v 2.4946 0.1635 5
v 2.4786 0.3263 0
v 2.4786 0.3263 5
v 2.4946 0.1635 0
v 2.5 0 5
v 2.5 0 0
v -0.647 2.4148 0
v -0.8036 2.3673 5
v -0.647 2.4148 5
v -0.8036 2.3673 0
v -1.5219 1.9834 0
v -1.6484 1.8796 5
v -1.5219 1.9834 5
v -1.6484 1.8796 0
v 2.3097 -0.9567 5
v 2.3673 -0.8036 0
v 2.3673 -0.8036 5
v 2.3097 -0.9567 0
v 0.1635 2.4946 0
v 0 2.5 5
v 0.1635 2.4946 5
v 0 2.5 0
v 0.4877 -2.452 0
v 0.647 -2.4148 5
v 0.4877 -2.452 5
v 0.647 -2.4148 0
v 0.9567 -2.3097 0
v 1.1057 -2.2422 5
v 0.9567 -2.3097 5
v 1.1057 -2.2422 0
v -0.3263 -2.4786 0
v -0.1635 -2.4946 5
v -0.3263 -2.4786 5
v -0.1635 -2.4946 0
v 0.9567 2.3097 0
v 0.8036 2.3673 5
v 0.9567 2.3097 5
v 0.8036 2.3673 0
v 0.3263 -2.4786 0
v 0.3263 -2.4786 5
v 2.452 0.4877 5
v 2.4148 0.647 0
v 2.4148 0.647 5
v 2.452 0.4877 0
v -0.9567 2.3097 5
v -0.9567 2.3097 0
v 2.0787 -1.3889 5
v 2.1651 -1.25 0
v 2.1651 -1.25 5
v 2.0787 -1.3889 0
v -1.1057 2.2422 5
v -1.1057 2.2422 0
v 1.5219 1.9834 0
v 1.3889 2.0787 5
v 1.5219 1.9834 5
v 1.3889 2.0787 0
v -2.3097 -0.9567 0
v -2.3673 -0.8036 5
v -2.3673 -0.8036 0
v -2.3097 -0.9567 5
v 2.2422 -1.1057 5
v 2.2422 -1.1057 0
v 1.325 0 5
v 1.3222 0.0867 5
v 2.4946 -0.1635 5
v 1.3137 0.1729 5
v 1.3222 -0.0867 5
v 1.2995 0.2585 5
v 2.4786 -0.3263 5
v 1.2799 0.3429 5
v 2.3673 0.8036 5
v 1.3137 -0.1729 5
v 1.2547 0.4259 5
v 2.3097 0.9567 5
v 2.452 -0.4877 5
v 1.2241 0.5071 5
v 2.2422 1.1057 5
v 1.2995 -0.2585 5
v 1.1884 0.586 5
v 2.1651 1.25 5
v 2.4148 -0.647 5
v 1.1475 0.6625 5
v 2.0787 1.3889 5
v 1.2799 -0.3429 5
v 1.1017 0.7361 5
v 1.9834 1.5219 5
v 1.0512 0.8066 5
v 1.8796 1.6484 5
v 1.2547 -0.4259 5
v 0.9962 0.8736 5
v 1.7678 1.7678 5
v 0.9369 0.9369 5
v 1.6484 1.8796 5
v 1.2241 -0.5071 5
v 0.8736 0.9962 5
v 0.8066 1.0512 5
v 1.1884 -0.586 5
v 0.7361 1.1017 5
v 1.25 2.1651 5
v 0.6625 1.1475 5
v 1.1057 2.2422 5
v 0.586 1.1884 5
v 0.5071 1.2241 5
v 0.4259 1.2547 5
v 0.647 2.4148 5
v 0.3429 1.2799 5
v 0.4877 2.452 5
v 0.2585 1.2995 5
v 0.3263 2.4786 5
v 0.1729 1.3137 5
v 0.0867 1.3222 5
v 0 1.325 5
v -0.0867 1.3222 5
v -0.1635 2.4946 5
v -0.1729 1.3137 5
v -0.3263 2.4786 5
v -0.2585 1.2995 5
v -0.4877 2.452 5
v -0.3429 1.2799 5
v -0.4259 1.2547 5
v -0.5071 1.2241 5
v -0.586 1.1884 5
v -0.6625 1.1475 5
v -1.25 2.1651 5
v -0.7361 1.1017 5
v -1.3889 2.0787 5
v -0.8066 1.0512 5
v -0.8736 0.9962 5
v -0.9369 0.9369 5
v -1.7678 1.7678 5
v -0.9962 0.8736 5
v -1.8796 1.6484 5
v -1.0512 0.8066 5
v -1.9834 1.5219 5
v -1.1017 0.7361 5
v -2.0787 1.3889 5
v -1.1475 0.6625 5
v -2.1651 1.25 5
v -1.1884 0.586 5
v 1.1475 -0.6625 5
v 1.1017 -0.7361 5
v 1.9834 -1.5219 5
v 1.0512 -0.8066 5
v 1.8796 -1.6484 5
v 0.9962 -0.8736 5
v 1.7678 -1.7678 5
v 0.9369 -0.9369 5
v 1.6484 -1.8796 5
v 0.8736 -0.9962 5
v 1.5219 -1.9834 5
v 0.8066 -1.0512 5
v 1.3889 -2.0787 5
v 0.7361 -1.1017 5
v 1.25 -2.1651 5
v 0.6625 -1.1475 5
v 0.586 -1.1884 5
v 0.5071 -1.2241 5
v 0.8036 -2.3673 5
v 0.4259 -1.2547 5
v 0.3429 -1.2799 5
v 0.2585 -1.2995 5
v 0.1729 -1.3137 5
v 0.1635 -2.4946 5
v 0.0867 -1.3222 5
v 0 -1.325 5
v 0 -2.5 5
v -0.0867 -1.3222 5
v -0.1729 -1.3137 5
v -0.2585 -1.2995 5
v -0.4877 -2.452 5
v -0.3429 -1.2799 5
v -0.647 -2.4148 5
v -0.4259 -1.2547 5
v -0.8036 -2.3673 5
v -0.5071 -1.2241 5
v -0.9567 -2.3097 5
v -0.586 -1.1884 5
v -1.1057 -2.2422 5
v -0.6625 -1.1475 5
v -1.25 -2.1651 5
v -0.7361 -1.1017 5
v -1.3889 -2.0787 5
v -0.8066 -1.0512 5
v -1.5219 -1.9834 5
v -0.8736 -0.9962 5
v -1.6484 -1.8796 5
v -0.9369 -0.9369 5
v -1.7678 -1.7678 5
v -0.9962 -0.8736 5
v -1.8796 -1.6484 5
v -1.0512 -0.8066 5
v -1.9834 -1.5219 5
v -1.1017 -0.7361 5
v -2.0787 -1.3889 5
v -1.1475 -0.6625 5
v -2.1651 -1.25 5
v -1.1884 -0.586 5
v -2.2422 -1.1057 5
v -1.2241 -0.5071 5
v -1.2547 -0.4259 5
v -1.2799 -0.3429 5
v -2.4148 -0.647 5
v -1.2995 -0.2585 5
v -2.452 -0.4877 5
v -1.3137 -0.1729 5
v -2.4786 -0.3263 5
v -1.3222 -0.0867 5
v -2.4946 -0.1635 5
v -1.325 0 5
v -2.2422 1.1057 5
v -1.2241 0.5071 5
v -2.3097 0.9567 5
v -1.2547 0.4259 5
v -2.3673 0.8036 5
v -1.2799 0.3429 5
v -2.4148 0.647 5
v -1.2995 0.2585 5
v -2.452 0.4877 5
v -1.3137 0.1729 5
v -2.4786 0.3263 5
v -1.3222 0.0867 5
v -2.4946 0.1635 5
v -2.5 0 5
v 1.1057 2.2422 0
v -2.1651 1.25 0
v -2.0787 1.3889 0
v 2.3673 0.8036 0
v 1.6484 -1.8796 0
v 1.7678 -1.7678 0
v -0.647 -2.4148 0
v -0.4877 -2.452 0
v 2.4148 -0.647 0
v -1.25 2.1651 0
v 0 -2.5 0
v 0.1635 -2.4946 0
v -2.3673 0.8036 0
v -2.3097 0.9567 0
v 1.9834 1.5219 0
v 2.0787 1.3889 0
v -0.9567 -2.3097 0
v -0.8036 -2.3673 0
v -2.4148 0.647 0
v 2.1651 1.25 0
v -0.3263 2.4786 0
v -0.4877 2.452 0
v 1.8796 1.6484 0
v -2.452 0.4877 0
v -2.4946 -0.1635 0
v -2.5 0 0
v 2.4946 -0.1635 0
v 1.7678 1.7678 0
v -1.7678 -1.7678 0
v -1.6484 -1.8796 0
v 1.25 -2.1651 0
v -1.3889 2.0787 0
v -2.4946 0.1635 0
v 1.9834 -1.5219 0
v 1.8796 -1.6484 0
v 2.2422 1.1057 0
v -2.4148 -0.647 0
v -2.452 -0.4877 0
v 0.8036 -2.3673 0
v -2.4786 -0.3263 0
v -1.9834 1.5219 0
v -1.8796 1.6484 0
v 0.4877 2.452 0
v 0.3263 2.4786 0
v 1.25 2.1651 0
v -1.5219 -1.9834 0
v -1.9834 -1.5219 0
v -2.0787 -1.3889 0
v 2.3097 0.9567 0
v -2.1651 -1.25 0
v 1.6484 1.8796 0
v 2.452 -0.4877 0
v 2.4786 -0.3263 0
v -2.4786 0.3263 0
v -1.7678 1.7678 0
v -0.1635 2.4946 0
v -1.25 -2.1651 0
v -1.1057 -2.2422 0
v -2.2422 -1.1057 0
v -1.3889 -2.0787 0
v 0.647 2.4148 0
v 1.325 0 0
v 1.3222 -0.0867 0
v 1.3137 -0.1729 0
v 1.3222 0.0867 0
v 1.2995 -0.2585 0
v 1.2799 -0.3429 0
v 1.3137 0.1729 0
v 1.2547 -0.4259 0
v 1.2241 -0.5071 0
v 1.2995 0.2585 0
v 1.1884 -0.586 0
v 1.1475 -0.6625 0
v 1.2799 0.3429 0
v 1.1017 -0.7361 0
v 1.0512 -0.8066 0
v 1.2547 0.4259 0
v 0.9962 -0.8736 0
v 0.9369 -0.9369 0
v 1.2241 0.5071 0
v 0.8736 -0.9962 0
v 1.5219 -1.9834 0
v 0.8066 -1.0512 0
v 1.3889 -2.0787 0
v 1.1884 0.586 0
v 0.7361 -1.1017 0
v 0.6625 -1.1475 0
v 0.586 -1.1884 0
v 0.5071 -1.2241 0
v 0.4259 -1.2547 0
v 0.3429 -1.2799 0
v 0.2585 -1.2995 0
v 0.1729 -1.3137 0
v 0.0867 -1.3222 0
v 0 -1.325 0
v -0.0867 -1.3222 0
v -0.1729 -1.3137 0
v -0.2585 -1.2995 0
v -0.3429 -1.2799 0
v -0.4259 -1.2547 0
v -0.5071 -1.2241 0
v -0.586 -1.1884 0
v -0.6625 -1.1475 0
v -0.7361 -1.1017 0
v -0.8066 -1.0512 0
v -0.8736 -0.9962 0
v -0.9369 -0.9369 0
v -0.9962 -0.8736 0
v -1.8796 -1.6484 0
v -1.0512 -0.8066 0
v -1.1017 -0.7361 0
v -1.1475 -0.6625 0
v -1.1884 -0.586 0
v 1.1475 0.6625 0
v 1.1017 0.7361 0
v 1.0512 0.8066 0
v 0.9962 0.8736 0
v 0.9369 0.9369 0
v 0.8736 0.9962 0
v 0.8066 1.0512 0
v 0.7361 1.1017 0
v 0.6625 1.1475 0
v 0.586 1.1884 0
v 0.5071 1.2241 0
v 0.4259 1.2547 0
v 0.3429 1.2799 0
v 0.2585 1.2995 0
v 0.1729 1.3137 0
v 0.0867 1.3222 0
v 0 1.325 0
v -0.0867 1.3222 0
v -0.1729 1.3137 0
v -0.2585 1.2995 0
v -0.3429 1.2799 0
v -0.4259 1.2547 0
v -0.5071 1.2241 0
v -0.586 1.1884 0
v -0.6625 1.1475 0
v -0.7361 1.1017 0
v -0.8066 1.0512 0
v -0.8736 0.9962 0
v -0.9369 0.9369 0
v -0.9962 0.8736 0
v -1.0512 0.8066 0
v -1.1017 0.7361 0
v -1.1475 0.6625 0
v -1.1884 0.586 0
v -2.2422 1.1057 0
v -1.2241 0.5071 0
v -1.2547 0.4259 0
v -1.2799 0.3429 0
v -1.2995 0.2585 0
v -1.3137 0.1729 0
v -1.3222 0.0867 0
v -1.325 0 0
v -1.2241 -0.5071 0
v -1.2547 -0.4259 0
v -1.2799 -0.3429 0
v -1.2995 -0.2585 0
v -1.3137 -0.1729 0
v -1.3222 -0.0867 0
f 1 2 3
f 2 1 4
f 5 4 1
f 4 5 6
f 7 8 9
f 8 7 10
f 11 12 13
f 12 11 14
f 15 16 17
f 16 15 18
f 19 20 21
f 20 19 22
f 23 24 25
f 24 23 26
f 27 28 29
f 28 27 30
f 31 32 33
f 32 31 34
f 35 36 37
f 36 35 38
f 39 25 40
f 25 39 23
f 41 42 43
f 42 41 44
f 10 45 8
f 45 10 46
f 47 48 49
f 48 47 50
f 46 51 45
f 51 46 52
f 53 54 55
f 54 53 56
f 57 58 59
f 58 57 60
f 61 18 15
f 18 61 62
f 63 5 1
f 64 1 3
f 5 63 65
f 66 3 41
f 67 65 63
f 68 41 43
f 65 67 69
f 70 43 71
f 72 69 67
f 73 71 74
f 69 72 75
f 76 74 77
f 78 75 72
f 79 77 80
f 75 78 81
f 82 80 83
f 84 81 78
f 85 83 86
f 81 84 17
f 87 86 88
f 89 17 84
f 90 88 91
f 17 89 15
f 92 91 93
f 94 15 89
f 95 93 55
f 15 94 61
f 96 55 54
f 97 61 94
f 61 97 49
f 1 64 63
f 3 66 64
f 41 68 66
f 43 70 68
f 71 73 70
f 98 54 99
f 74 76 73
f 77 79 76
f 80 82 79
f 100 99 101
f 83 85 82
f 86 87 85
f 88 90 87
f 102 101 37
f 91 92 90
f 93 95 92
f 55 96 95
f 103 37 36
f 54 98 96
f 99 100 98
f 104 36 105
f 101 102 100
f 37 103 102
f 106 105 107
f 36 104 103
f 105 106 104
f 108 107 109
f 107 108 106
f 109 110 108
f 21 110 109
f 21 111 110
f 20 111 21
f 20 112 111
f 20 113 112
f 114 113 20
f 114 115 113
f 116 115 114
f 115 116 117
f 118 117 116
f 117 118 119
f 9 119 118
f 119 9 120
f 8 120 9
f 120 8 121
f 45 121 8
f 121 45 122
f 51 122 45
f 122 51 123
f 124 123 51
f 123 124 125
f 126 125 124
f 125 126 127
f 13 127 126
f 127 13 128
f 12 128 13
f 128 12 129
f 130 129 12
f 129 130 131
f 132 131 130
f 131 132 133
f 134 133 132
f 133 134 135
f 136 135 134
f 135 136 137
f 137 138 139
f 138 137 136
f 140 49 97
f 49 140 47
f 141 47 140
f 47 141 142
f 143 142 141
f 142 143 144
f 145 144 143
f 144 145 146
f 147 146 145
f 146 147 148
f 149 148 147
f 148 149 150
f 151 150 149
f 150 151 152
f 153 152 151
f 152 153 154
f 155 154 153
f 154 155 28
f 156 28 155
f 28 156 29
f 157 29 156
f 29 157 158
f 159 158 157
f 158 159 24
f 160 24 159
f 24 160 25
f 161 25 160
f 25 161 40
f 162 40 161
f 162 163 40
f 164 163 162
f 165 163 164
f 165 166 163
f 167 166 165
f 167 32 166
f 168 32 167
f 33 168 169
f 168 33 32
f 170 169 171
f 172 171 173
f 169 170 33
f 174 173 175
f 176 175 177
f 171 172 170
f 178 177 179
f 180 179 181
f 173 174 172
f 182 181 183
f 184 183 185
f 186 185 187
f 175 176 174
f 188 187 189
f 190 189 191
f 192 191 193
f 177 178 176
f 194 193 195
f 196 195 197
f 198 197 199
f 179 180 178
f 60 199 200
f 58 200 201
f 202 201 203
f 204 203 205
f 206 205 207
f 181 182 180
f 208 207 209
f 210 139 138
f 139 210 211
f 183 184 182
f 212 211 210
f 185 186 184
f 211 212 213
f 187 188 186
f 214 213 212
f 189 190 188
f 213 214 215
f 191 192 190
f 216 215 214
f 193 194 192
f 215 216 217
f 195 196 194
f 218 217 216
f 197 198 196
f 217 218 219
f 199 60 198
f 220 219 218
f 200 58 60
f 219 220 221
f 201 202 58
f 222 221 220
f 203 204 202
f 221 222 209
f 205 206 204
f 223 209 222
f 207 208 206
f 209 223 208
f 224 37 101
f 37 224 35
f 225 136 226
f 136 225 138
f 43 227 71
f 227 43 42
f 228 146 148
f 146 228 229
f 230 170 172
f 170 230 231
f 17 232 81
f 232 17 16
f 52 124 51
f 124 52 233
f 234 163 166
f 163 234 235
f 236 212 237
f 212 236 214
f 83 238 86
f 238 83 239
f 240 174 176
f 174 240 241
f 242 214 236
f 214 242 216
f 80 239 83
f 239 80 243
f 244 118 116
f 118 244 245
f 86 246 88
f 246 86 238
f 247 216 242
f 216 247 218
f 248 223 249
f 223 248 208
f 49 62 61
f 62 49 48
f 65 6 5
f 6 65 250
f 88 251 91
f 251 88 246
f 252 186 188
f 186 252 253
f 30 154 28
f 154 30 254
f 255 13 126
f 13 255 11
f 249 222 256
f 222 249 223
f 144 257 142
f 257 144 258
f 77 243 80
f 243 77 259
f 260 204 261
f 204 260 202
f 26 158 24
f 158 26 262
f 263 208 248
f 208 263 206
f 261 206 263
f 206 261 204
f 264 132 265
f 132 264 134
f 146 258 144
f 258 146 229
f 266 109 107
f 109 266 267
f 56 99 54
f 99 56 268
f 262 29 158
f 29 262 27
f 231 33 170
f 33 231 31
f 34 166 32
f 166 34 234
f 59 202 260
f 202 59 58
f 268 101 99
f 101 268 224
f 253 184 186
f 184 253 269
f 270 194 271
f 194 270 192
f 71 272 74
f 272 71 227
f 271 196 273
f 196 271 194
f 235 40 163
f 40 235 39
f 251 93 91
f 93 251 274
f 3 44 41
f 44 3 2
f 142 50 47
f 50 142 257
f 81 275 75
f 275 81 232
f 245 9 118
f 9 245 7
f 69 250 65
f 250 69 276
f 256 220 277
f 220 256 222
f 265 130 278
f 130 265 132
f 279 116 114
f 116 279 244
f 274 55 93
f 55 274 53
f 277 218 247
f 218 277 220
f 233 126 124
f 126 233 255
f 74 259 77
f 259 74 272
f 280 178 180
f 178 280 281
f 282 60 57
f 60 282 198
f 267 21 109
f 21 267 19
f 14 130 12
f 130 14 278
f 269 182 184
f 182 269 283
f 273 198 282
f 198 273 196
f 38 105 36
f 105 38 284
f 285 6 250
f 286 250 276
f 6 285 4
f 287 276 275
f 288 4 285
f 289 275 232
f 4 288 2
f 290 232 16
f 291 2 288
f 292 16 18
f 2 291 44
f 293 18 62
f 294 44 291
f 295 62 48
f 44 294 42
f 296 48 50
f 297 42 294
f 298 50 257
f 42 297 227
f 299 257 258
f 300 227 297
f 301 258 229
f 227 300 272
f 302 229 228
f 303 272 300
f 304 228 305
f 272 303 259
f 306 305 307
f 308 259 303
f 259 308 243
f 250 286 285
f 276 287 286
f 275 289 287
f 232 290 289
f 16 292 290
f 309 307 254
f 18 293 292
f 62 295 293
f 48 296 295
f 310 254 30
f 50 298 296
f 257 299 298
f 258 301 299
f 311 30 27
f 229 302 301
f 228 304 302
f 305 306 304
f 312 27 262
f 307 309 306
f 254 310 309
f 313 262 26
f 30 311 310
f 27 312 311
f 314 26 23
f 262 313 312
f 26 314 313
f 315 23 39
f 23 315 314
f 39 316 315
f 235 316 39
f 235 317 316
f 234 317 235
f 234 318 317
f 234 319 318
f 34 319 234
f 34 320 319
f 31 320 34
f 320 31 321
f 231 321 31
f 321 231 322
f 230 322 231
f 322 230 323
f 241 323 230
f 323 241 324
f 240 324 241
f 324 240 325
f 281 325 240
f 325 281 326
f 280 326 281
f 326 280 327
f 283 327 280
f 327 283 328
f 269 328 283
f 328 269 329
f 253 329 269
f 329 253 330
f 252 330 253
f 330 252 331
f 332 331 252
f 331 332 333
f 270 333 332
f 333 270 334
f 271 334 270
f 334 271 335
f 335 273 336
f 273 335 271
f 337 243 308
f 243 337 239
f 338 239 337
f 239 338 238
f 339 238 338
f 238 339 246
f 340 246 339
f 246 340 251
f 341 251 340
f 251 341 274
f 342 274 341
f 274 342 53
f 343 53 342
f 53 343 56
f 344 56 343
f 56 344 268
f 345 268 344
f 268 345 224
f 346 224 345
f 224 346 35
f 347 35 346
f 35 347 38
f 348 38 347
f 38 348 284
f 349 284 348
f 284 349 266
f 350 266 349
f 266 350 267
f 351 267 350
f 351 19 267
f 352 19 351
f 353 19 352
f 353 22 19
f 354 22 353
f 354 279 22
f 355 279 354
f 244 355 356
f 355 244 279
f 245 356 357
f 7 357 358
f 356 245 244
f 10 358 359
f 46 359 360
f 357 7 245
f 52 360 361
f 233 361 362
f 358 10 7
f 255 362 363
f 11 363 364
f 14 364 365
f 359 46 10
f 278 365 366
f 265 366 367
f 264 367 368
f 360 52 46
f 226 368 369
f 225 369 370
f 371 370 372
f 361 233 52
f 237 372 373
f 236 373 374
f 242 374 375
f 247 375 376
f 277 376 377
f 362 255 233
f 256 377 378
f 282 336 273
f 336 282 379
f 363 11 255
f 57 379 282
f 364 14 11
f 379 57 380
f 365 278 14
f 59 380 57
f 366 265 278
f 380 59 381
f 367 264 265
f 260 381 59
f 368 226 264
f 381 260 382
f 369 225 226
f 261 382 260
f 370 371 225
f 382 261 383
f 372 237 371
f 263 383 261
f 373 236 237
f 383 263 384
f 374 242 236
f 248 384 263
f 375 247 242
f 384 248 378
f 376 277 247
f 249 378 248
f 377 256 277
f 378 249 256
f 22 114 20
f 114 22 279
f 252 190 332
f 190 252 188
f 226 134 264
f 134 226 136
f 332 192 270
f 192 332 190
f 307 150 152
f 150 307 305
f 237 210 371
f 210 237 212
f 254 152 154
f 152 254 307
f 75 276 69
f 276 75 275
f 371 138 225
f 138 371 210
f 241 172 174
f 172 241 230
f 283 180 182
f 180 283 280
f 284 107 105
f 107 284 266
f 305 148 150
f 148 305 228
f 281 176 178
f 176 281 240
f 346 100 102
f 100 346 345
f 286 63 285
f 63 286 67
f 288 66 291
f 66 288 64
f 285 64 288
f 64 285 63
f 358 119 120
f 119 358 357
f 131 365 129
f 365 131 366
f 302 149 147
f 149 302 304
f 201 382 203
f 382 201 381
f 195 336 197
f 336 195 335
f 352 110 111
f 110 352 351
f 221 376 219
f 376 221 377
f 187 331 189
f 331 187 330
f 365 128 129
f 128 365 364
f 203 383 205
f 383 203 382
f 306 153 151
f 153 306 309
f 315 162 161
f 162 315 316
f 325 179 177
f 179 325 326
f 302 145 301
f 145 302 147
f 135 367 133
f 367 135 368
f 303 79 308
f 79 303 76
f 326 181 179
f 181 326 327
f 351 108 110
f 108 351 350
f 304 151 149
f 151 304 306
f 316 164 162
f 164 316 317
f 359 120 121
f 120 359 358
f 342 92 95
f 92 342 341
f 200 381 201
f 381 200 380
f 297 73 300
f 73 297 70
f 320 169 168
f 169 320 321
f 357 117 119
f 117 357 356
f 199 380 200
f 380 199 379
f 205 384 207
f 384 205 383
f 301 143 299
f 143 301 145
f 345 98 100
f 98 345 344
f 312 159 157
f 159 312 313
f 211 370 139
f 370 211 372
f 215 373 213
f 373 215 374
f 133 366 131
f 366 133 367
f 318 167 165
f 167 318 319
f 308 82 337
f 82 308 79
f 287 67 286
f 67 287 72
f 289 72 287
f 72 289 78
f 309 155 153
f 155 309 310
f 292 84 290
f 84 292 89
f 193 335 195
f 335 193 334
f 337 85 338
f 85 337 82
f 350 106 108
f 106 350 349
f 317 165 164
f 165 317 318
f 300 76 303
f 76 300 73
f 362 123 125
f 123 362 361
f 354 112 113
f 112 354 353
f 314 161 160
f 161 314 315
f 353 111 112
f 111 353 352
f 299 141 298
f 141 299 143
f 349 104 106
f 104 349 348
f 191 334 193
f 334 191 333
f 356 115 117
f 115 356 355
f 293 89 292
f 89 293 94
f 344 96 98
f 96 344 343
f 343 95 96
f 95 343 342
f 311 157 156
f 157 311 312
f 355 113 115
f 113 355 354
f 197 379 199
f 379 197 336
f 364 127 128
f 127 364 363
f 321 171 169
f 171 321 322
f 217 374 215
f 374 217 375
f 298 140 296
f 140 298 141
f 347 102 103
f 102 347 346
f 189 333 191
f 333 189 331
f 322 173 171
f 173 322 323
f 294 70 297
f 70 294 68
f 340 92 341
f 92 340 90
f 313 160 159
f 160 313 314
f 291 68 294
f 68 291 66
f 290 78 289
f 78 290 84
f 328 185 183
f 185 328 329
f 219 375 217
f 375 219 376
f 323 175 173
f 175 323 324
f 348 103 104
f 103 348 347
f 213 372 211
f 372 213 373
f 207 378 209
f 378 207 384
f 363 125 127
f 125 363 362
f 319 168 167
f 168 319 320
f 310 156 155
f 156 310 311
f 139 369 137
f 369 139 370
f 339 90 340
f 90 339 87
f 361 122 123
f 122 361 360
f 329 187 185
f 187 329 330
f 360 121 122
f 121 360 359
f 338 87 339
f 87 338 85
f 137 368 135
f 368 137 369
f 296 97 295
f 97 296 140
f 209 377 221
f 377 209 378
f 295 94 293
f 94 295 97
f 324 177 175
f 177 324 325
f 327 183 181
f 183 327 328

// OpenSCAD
// Stand-off: ID=2.5 mm, OD=5 mm, Length=5 mm
// Printable-friendly with optional tolerance & bevels.

id   = 2.5;   // inner diameter (hole)
od   = 5.0;   // outer diameter
len  = 5.0;   // length
$fn  = 96;    // smoothness

// Optional tweaks
tol        = 0.15;   // add e.g. 0.15 for easier screw fit

module standoff(id=2.5, od=5.0, len=5.0, tol=0.0){
    difference(){
        // main body
        cylinder(h=len, d=od, center=false);

        // through-hole (with optional tolerance)
        translate([0,0,-0.1])  // tiny offset to ensure clean cut
            cylinder(h=len+0.2, d=id+tol, center=false);
    }

}

// render it
standoff(id=id, od=od, len=len, tol=tol);
